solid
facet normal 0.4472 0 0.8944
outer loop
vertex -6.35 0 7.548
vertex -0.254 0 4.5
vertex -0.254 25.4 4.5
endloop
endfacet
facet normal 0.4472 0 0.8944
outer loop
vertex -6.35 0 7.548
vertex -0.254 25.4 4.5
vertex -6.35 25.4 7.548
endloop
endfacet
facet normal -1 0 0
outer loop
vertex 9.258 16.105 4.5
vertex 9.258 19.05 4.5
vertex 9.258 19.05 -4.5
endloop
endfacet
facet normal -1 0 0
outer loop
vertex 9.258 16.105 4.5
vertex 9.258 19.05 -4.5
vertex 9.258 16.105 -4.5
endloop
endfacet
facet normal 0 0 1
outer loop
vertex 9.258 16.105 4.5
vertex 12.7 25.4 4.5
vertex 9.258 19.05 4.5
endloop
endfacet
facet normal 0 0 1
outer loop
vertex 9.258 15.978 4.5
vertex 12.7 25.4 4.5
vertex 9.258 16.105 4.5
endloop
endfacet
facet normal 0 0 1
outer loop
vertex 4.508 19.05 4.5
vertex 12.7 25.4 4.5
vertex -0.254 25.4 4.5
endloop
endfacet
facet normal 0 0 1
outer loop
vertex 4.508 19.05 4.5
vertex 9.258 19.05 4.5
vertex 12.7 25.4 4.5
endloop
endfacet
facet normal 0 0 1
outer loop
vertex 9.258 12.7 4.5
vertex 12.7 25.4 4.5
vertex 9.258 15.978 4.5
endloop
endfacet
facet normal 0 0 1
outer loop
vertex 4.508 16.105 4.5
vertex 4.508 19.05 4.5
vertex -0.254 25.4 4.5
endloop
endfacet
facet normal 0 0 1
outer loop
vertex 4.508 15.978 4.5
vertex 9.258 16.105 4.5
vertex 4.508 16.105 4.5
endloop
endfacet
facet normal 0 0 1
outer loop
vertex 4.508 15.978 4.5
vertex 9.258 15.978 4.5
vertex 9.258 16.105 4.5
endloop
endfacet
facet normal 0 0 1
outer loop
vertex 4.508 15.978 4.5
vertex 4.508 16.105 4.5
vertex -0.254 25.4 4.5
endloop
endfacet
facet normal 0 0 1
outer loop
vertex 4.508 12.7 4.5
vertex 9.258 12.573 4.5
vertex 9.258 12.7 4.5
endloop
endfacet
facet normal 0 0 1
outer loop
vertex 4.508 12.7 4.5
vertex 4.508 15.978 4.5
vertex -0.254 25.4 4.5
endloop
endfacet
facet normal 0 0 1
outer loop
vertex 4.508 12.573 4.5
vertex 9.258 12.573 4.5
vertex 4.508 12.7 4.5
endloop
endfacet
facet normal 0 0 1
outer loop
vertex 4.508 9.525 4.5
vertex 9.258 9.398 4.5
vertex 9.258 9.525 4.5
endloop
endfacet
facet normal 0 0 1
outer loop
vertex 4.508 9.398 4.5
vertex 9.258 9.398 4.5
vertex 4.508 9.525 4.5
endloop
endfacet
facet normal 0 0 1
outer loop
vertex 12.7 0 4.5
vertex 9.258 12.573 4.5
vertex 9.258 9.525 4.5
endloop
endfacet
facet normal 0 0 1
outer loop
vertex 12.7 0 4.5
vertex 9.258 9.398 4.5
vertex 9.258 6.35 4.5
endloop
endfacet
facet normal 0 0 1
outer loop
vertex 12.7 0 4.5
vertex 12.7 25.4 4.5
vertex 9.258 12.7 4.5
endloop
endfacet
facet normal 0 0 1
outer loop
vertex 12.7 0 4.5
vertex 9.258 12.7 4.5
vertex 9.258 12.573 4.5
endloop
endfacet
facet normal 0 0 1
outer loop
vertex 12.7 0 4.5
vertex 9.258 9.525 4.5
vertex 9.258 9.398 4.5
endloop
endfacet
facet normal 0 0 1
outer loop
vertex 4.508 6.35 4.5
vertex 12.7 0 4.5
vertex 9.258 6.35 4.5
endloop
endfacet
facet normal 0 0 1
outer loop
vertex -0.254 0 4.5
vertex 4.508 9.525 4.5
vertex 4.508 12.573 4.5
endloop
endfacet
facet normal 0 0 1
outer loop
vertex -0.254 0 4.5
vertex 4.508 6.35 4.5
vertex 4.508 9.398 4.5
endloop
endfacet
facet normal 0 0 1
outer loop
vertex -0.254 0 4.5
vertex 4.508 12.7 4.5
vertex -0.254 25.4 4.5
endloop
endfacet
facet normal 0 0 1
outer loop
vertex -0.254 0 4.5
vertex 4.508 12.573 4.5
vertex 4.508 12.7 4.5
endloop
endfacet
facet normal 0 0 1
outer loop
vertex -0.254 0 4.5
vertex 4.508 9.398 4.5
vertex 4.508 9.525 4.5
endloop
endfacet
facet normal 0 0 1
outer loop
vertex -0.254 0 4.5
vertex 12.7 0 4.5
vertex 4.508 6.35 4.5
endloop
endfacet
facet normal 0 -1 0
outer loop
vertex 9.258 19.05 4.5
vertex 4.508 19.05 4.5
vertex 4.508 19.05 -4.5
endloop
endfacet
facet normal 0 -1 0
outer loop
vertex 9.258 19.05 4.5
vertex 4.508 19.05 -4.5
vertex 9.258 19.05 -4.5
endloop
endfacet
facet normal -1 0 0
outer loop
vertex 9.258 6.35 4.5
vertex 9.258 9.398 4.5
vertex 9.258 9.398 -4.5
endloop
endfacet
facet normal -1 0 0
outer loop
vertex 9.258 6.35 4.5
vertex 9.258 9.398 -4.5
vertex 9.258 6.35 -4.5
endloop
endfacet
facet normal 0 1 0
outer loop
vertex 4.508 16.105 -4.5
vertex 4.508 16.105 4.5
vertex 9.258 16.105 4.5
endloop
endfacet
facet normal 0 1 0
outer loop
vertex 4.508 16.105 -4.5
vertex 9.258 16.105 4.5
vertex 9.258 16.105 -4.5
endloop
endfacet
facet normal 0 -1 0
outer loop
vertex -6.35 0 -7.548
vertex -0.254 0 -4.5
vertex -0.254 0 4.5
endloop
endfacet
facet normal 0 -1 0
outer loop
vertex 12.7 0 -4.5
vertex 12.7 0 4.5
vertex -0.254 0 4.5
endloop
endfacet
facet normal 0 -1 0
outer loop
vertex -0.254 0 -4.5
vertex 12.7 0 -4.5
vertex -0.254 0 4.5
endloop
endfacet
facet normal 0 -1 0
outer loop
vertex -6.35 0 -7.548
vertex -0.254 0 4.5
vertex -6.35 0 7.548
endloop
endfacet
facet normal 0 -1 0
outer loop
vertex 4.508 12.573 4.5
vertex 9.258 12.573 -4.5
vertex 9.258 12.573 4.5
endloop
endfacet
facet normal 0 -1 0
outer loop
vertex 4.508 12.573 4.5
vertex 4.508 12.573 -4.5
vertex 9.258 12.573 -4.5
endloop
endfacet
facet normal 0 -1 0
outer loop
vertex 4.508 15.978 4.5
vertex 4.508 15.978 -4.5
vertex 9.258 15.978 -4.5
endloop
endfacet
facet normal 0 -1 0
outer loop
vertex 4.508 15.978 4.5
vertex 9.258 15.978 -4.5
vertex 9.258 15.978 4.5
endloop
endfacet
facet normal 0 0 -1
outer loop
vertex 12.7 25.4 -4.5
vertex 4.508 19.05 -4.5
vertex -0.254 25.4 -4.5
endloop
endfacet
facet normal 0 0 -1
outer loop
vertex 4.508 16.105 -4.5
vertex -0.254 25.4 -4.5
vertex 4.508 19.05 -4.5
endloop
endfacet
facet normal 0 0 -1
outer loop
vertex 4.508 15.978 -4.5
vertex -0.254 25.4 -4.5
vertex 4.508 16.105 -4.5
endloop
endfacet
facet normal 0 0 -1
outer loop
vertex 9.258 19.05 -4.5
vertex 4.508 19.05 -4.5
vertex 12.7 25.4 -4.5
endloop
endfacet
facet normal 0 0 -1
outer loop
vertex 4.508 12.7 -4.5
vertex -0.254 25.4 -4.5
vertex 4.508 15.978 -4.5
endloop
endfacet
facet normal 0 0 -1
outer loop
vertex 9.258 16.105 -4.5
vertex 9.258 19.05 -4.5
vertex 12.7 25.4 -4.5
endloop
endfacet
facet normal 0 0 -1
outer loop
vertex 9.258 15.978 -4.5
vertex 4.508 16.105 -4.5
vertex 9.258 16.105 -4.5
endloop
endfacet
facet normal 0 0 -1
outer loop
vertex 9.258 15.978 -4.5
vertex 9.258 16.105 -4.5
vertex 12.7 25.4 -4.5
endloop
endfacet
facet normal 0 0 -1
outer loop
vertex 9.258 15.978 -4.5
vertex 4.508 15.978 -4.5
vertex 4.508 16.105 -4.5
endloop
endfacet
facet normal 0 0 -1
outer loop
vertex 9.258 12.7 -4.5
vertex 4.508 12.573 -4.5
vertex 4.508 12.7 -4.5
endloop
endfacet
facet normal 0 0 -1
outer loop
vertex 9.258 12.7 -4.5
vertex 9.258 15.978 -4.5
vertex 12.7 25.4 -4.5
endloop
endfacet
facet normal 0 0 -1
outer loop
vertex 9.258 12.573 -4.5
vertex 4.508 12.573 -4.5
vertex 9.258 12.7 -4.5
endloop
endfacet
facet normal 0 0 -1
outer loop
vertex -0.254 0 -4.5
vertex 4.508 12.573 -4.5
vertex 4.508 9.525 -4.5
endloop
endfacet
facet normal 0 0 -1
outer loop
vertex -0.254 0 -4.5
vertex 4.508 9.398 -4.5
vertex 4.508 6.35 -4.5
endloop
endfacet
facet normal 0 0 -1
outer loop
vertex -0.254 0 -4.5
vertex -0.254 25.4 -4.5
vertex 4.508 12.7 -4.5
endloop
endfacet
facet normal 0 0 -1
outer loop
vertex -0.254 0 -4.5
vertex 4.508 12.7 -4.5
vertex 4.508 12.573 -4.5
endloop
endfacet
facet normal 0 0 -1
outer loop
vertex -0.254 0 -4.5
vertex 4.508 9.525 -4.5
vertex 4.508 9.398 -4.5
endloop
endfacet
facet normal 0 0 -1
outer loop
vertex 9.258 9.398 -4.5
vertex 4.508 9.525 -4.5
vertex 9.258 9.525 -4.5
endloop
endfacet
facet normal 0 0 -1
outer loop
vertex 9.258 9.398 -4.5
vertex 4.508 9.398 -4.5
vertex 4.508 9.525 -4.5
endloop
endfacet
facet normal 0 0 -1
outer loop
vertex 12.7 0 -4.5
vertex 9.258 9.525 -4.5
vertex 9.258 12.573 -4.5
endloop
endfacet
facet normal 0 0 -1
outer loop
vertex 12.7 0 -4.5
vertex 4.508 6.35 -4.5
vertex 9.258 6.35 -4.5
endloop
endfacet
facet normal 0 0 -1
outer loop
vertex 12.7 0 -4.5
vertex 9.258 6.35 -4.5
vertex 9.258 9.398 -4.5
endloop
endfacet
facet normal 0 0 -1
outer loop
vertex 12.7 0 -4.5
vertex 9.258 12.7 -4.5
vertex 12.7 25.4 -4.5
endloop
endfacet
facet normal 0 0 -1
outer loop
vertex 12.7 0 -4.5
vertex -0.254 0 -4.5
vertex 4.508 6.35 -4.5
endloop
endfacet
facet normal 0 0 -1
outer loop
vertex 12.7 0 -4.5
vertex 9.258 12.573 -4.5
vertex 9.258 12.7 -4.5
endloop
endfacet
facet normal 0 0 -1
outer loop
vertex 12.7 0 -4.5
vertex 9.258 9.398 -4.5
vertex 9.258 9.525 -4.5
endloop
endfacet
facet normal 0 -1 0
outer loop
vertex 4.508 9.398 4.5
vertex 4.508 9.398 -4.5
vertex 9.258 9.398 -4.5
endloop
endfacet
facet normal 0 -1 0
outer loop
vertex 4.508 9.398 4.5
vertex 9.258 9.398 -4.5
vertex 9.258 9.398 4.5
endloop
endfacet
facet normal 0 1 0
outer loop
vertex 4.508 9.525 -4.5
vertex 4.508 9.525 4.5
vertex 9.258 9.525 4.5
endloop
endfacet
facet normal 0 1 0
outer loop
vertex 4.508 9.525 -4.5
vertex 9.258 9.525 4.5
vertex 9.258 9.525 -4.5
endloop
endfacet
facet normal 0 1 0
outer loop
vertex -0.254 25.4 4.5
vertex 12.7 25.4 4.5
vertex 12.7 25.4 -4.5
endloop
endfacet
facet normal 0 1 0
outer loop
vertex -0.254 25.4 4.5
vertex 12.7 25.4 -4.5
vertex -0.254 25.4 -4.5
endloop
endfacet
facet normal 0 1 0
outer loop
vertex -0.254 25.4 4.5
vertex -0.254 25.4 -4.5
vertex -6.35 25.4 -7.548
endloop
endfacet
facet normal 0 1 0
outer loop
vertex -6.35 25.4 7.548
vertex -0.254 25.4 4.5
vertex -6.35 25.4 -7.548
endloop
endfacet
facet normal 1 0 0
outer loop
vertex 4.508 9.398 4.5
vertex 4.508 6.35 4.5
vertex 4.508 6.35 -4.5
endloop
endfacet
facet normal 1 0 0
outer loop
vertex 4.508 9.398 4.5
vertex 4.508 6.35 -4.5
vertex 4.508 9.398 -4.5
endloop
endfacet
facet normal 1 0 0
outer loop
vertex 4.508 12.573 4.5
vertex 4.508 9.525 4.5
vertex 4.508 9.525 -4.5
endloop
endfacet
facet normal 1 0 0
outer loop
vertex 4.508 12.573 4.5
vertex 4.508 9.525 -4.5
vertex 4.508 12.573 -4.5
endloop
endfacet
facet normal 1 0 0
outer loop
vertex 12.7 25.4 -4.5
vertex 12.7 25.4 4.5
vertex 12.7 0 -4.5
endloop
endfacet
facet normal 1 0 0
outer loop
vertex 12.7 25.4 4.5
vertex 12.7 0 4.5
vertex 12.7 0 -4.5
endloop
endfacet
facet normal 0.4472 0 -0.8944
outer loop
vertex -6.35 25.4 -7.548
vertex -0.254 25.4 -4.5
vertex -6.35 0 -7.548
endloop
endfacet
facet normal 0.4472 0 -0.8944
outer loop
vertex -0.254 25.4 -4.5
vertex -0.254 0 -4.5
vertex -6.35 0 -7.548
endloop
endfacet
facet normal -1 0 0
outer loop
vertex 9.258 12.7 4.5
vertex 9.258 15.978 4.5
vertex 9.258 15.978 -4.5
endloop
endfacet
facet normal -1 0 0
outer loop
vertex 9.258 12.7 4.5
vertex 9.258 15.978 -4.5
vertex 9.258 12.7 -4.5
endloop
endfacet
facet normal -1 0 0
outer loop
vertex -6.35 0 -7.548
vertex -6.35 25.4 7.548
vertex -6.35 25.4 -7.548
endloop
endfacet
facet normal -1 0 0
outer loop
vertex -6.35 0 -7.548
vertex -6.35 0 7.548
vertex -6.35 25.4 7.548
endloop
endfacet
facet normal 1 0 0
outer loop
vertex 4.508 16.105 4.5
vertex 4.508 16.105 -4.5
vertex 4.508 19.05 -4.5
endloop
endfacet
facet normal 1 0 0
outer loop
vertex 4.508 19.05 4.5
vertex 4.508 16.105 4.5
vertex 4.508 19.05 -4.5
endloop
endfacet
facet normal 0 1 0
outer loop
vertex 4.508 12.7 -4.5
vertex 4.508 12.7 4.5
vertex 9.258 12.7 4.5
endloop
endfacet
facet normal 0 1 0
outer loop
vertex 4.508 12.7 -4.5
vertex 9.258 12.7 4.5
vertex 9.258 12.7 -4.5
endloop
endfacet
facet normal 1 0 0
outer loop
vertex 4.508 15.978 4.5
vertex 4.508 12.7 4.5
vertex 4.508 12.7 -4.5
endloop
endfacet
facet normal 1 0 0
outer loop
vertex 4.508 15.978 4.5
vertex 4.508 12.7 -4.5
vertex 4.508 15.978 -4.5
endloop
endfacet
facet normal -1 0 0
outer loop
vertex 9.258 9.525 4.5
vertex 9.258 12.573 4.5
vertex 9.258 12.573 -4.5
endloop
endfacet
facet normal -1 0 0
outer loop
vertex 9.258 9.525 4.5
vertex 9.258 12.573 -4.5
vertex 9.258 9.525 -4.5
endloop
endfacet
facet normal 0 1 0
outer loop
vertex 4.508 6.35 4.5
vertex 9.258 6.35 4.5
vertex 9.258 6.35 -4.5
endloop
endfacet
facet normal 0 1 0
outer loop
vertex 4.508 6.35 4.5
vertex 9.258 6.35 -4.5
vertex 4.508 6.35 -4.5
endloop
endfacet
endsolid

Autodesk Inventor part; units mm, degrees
ref_plane "YZ Plane" through (0, 0, 0) normal (1, 0, 0) x (0, 1, 0)
ref_plane "XZ Plane" through (0, 0, 0) normal (0, 1, 0) x (-1, 0, 0)
ref_plane "XY Plane" through (0, 0, 0) normal (0, 0, 1) x (1, 0, 0)
sketch "Sketch1" plane through (0, 0, 0) normal (0, 1, 0) x (-1, 0, 0)
  line L0 (0, 4.5) -> (-12.7, 4.5)
  line L1 (-12.7, 4.5) -> (-12.7, -4.5)
  line L2 (-12.7, -4.5) -> (0, -4.5)
  line L3 (0, 4.5) -> (0.254, 4.5)
  line L4 (0.254, -4.5) -> (0, -4.5)
  line L5 (6.35, 4.5) -> (6.35, -4.5)
  line L6 (6.35, 7.548) -> (6.35, 4.5)
  line L7 (6.35, -7.548) -> (6.35, -4.5)
  line L8 (0.254, 4.5) -> (6.35, 7.548)
  line L9 (0.254, -4.5) -> (6.35, -7.548)
  point P0 (0, 0)
  point P1 (0, -4.5)
  dimension "d1" = 9
  dimension "d2" = 4.5
  dimension "d7" = 3.048
  dimension "d8" = 3.048
  dimension "d9" = 12.954
  dimension "d16" = 6.096
extrude "Shape" add sketch "Sketch1" along normal blind 25.4
sketch "Sketch2" plane through (-0.254, 0, 4.5) normal (0, 0, 1) x (1, 0, 0)
  line L0 (4.7625, 19.05) -> (9.5125, 19.05)
  line L1 (9.5125, 19.05) -> (9.5125, 6.35)
  line L2 (9.5125, 6.35) -> (4.7625, 6.35)
  line L3 (4.7625, 6.35) -> (4.7625, 19.05)
  point P0 (0.254, 0)
  dimension "d12" = 4.75
  dimension "d13" = 12.7
extrude "Bridge" cut sketch "Sketch2" against normal through all
sketch "Sketch3" plane through (4.5085, 6.35, 4.5) normal (1, 0, 0) x (0, 0, -1)
  line L0 (9, 12.7) -> (9, 0) construction
  line L1 (0, 12.7) -> (9, 12.7) construction
  line L2 (9, 0) -> (0, 0) construction
  line L3 (0, -6.35) -> (0, 19.05) projected
  line L4 (9, -6.35) -> (9, 19.05) projected
  line L5 (0, 9.7549) -> (9, 9.7549)
  line L6 (9, 9.7549) -> (9, 9.6279)
  line L7 (9, 9.6279) -> (0, 9.6279)
  line L8 (0, 9.6279) -> (0, 9.7549)
  line L9 (0, 6.35) -> (9, 6.35)
  line L10 (9, 6.35) -> (9, 6.223)
  line L11 (9, 6.223) -> (0, 6.223)
  line L12 (0, 6.223) -> (0, 6.35)
  line L13 (0, 3.175) -> (9, 3.175)
  line L14 (9, 3.175) -> (9, 3.048)
  line L15 (9, 3.048) -> (0, 3.048)
  line L16 (0, 3.048) -> (0, 3.175)
  point P0 (4.5, -6.35)
  point P1 (0, 3.048)
  point P2 (0, 6.223)
  point P3 (9, 6.35)
  point P4 (0, 9.6279)
  point P5 (9, 9.7549)
  dimension "d17" = 0.127
  dimension "d18" = 0.127
  dimension "d19" = 0.127
  dimension "d20" = 2.9451
  dimension "d22" = 9.525
extrude "Supports" add sketch "Sketch3" along normal up to surface (4.75 mm away) contours L3 L13 L4 L15 | L3 L9 L4 L11 | L3 L5 L4 L7
equation "\"d8\" = d7"
equation "\"d18\" = d17"
equation "\"d19\" = d17"
properties part number "Sliding test insert"
